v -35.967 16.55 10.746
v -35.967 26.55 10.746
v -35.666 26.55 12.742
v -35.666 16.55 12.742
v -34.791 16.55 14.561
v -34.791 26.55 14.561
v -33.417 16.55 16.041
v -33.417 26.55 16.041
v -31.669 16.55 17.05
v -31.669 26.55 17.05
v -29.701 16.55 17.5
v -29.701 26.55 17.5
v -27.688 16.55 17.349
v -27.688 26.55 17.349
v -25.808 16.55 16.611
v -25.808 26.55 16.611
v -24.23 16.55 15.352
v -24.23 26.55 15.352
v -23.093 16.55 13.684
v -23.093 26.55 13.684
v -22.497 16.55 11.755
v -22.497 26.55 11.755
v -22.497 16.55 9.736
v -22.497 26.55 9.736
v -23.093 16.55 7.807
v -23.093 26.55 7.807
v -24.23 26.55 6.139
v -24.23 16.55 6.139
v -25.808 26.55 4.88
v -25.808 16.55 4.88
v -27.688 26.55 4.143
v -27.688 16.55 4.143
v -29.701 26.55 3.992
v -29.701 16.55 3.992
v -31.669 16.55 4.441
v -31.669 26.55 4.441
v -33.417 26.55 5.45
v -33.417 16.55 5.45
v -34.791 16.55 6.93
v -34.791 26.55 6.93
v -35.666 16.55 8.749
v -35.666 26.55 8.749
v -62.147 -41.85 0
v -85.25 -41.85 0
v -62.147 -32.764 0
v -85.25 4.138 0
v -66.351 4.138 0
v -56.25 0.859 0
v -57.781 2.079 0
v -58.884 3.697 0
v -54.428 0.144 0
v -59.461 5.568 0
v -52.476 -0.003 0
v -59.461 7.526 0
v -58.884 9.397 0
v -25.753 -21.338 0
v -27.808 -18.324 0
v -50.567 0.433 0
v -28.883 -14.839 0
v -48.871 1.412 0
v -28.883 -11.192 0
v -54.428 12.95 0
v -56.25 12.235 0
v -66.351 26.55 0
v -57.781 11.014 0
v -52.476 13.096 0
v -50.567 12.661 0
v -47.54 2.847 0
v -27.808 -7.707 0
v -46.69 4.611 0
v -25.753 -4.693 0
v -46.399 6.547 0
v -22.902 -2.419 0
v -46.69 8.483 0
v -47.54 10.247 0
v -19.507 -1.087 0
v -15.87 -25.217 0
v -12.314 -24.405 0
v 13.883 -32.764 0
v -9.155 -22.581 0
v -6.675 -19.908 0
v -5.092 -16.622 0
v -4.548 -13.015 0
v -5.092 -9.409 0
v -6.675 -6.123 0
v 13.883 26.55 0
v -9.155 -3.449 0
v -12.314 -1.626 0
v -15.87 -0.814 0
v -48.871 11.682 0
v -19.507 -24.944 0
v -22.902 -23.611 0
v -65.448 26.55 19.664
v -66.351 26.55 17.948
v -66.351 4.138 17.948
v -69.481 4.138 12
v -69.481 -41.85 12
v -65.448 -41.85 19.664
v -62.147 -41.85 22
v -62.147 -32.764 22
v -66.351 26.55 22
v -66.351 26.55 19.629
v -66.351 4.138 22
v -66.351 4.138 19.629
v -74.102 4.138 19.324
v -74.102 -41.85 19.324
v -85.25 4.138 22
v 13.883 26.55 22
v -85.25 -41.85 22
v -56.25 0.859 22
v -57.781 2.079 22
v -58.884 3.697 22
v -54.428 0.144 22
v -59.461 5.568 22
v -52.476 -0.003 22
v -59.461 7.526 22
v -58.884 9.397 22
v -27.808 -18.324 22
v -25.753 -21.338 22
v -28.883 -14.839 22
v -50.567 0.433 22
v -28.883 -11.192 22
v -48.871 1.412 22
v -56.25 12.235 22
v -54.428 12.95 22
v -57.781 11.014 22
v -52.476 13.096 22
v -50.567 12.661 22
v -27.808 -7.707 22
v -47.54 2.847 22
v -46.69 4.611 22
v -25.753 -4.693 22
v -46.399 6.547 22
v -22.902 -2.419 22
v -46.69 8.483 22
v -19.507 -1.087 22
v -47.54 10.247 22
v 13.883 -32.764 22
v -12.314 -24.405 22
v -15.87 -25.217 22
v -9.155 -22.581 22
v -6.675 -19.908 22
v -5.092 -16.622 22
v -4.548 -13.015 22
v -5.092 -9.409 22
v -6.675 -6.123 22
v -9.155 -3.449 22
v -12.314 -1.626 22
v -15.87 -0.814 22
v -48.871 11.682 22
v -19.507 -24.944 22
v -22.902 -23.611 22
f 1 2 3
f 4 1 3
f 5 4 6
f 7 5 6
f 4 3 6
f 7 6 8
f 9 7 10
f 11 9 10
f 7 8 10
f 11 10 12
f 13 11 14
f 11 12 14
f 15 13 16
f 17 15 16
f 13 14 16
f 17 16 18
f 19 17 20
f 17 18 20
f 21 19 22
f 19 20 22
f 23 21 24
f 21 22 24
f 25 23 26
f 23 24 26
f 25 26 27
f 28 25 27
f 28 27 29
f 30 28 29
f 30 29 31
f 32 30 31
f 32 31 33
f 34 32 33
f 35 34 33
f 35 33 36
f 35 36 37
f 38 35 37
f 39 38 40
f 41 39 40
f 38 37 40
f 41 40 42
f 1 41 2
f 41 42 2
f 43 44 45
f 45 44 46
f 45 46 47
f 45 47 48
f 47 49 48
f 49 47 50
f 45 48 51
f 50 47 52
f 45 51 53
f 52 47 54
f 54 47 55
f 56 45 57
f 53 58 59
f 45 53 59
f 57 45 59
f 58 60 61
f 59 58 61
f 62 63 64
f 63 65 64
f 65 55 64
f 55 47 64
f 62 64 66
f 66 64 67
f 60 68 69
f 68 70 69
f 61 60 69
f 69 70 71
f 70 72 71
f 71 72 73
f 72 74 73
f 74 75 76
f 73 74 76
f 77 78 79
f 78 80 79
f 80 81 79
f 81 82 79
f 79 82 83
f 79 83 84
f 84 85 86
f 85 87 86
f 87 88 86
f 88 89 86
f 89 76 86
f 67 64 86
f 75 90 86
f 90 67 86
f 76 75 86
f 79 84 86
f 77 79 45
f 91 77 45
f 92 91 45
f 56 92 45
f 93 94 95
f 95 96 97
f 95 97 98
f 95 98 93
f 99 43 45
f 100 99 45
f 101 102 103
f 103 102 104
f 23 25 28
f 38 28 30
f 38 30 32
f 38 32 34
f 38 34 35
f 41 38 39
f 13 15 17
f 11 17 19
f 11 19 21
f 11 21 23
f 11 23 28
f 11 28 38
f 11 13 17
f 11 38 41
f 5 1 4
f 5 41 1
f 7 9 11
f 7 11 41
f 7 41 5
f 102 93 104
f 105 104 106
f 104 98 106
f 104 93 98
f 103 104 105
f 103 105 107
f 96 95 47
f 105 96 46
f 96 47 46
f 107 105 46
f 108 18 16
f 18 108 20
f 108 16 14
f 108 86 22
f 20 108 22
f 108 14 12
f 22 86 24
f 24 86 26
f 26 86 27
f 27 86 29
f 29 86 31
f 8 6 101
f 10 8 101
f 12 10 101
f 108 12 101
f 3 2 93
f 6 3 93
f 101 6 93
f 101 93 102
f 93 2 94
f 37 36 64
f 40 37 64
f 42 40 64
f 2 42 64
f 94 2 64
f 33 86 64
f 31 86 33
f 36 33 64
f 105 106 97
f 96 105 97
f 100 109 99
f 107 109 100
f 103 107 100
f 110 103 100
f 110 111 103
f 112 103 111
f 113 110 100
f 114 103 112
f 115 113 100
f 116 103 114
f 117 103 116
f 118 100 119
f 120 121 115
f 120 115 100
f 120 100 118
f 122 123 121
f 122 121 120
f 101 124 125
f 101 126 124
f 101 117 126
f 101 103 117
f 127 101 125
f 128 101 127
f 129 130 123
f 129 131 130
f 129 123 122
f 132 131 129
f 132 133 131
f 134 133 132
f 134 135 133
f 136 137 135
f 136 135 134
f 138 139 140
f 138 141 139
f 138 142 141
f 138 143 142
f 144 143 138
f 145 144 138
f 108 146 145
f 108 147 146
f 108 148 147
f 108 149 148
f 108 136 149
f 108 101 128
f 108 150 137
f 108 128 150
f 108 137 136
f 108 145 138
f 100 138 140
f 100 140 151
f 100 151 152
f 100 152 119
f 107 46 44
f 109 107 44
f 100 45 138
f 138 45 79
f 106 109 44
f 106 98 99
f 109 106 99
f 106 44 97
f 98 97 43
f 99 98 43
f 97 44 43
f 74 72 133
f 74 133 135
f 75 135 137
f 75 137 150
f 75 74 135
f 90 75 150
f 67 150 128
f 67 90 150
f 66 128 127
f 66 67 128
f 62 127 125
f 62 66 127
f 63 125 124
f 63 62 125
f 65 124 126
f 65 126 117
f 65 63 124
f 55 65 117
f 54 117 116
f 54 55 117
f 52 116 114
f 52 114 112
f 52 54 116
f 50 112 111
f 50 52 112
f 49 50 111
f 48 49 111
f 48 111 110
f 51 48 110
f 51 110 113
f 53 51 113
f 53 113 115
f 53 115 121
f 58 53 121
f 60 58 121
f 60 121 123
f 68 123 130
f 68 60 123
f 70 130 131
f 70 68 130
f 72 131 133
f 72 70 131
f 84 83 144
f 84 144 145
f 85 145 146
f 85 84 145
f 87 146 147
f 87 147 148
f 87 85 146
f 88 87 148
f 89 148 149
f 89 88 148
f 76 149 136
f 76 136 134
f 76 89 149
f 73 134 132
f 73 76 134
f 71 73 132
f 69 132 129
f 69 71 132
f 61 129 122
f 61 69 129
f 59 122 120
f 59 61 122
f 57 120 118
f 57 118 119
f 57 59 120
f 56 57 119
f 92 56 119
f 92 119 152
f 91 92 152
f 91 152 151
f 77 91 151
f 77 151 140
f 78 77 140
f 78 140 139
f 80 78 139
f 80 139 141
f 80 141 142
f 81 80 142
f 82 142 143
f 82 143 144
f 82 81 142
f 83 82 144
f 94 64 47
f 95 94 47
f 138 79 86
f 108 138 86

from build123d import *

# Parameters (mm, degrees)
F0_R     = 12.235382
F0_R_2   = 6.56791
F1_DEPTH = 22
F3_DEPTH = 68.400986
F4_R     = 6.772797
F5_DEPTH = 10


with BuildPart() as f1:
    # F0 (on Top) → F1 (new body)
    with BuildSketch(Plane.XY):
        Polygon((-62.147137, -32.764492), (13.882609, -32.764492), (13.882609, 26.550179), (-66.351078, 26.550179), (-66.351078, 4.138138), (-66.351078, -32.764492), align=None)
        with Locations((-16.783873, -13.015332)):
            Circle(F0_R, mode=Mode.SUBTRACT)
        with Locations((-52.966461, 6.546799)):
            Circle(F0_R_2, mode=Mode.SUBTRACT)
        Polygon((-62.147137, -41.849807), (-62.147137, -32.764492), (-66.351078, -32.764492), (-66.351078, 4.138138), (-85.250083, 4.138138), (-85.250083, -41.849807), align=None)
    extrude(amount=F1_DEPTH)

    # F2 (on face) → F3 (cut, through all)
    with BuildSketch(Plane.XZ.offset(41.849807)):
        Polygon((-69.480886, 11.999899), (-65.448255, 19.663964), (-74.101845, 19.324293), align=None)
    extrude(amount=-F3_DEPTH, mode=Mode.SUBTRACT)

    # F4 (on face) → F5 (cut)
    with BuildSketch(Plane(origin=(0, 26.550179, 0), x_dir=(-1, 0, 0), z_dir=(0, 1, 0))):
        with Locations((29.194595, 10.745674)):
            Circle(F4_R)
    extrude(amount=-F5_DEPTH, mode=Mode.SUBTRACT)


solid = f1.part
